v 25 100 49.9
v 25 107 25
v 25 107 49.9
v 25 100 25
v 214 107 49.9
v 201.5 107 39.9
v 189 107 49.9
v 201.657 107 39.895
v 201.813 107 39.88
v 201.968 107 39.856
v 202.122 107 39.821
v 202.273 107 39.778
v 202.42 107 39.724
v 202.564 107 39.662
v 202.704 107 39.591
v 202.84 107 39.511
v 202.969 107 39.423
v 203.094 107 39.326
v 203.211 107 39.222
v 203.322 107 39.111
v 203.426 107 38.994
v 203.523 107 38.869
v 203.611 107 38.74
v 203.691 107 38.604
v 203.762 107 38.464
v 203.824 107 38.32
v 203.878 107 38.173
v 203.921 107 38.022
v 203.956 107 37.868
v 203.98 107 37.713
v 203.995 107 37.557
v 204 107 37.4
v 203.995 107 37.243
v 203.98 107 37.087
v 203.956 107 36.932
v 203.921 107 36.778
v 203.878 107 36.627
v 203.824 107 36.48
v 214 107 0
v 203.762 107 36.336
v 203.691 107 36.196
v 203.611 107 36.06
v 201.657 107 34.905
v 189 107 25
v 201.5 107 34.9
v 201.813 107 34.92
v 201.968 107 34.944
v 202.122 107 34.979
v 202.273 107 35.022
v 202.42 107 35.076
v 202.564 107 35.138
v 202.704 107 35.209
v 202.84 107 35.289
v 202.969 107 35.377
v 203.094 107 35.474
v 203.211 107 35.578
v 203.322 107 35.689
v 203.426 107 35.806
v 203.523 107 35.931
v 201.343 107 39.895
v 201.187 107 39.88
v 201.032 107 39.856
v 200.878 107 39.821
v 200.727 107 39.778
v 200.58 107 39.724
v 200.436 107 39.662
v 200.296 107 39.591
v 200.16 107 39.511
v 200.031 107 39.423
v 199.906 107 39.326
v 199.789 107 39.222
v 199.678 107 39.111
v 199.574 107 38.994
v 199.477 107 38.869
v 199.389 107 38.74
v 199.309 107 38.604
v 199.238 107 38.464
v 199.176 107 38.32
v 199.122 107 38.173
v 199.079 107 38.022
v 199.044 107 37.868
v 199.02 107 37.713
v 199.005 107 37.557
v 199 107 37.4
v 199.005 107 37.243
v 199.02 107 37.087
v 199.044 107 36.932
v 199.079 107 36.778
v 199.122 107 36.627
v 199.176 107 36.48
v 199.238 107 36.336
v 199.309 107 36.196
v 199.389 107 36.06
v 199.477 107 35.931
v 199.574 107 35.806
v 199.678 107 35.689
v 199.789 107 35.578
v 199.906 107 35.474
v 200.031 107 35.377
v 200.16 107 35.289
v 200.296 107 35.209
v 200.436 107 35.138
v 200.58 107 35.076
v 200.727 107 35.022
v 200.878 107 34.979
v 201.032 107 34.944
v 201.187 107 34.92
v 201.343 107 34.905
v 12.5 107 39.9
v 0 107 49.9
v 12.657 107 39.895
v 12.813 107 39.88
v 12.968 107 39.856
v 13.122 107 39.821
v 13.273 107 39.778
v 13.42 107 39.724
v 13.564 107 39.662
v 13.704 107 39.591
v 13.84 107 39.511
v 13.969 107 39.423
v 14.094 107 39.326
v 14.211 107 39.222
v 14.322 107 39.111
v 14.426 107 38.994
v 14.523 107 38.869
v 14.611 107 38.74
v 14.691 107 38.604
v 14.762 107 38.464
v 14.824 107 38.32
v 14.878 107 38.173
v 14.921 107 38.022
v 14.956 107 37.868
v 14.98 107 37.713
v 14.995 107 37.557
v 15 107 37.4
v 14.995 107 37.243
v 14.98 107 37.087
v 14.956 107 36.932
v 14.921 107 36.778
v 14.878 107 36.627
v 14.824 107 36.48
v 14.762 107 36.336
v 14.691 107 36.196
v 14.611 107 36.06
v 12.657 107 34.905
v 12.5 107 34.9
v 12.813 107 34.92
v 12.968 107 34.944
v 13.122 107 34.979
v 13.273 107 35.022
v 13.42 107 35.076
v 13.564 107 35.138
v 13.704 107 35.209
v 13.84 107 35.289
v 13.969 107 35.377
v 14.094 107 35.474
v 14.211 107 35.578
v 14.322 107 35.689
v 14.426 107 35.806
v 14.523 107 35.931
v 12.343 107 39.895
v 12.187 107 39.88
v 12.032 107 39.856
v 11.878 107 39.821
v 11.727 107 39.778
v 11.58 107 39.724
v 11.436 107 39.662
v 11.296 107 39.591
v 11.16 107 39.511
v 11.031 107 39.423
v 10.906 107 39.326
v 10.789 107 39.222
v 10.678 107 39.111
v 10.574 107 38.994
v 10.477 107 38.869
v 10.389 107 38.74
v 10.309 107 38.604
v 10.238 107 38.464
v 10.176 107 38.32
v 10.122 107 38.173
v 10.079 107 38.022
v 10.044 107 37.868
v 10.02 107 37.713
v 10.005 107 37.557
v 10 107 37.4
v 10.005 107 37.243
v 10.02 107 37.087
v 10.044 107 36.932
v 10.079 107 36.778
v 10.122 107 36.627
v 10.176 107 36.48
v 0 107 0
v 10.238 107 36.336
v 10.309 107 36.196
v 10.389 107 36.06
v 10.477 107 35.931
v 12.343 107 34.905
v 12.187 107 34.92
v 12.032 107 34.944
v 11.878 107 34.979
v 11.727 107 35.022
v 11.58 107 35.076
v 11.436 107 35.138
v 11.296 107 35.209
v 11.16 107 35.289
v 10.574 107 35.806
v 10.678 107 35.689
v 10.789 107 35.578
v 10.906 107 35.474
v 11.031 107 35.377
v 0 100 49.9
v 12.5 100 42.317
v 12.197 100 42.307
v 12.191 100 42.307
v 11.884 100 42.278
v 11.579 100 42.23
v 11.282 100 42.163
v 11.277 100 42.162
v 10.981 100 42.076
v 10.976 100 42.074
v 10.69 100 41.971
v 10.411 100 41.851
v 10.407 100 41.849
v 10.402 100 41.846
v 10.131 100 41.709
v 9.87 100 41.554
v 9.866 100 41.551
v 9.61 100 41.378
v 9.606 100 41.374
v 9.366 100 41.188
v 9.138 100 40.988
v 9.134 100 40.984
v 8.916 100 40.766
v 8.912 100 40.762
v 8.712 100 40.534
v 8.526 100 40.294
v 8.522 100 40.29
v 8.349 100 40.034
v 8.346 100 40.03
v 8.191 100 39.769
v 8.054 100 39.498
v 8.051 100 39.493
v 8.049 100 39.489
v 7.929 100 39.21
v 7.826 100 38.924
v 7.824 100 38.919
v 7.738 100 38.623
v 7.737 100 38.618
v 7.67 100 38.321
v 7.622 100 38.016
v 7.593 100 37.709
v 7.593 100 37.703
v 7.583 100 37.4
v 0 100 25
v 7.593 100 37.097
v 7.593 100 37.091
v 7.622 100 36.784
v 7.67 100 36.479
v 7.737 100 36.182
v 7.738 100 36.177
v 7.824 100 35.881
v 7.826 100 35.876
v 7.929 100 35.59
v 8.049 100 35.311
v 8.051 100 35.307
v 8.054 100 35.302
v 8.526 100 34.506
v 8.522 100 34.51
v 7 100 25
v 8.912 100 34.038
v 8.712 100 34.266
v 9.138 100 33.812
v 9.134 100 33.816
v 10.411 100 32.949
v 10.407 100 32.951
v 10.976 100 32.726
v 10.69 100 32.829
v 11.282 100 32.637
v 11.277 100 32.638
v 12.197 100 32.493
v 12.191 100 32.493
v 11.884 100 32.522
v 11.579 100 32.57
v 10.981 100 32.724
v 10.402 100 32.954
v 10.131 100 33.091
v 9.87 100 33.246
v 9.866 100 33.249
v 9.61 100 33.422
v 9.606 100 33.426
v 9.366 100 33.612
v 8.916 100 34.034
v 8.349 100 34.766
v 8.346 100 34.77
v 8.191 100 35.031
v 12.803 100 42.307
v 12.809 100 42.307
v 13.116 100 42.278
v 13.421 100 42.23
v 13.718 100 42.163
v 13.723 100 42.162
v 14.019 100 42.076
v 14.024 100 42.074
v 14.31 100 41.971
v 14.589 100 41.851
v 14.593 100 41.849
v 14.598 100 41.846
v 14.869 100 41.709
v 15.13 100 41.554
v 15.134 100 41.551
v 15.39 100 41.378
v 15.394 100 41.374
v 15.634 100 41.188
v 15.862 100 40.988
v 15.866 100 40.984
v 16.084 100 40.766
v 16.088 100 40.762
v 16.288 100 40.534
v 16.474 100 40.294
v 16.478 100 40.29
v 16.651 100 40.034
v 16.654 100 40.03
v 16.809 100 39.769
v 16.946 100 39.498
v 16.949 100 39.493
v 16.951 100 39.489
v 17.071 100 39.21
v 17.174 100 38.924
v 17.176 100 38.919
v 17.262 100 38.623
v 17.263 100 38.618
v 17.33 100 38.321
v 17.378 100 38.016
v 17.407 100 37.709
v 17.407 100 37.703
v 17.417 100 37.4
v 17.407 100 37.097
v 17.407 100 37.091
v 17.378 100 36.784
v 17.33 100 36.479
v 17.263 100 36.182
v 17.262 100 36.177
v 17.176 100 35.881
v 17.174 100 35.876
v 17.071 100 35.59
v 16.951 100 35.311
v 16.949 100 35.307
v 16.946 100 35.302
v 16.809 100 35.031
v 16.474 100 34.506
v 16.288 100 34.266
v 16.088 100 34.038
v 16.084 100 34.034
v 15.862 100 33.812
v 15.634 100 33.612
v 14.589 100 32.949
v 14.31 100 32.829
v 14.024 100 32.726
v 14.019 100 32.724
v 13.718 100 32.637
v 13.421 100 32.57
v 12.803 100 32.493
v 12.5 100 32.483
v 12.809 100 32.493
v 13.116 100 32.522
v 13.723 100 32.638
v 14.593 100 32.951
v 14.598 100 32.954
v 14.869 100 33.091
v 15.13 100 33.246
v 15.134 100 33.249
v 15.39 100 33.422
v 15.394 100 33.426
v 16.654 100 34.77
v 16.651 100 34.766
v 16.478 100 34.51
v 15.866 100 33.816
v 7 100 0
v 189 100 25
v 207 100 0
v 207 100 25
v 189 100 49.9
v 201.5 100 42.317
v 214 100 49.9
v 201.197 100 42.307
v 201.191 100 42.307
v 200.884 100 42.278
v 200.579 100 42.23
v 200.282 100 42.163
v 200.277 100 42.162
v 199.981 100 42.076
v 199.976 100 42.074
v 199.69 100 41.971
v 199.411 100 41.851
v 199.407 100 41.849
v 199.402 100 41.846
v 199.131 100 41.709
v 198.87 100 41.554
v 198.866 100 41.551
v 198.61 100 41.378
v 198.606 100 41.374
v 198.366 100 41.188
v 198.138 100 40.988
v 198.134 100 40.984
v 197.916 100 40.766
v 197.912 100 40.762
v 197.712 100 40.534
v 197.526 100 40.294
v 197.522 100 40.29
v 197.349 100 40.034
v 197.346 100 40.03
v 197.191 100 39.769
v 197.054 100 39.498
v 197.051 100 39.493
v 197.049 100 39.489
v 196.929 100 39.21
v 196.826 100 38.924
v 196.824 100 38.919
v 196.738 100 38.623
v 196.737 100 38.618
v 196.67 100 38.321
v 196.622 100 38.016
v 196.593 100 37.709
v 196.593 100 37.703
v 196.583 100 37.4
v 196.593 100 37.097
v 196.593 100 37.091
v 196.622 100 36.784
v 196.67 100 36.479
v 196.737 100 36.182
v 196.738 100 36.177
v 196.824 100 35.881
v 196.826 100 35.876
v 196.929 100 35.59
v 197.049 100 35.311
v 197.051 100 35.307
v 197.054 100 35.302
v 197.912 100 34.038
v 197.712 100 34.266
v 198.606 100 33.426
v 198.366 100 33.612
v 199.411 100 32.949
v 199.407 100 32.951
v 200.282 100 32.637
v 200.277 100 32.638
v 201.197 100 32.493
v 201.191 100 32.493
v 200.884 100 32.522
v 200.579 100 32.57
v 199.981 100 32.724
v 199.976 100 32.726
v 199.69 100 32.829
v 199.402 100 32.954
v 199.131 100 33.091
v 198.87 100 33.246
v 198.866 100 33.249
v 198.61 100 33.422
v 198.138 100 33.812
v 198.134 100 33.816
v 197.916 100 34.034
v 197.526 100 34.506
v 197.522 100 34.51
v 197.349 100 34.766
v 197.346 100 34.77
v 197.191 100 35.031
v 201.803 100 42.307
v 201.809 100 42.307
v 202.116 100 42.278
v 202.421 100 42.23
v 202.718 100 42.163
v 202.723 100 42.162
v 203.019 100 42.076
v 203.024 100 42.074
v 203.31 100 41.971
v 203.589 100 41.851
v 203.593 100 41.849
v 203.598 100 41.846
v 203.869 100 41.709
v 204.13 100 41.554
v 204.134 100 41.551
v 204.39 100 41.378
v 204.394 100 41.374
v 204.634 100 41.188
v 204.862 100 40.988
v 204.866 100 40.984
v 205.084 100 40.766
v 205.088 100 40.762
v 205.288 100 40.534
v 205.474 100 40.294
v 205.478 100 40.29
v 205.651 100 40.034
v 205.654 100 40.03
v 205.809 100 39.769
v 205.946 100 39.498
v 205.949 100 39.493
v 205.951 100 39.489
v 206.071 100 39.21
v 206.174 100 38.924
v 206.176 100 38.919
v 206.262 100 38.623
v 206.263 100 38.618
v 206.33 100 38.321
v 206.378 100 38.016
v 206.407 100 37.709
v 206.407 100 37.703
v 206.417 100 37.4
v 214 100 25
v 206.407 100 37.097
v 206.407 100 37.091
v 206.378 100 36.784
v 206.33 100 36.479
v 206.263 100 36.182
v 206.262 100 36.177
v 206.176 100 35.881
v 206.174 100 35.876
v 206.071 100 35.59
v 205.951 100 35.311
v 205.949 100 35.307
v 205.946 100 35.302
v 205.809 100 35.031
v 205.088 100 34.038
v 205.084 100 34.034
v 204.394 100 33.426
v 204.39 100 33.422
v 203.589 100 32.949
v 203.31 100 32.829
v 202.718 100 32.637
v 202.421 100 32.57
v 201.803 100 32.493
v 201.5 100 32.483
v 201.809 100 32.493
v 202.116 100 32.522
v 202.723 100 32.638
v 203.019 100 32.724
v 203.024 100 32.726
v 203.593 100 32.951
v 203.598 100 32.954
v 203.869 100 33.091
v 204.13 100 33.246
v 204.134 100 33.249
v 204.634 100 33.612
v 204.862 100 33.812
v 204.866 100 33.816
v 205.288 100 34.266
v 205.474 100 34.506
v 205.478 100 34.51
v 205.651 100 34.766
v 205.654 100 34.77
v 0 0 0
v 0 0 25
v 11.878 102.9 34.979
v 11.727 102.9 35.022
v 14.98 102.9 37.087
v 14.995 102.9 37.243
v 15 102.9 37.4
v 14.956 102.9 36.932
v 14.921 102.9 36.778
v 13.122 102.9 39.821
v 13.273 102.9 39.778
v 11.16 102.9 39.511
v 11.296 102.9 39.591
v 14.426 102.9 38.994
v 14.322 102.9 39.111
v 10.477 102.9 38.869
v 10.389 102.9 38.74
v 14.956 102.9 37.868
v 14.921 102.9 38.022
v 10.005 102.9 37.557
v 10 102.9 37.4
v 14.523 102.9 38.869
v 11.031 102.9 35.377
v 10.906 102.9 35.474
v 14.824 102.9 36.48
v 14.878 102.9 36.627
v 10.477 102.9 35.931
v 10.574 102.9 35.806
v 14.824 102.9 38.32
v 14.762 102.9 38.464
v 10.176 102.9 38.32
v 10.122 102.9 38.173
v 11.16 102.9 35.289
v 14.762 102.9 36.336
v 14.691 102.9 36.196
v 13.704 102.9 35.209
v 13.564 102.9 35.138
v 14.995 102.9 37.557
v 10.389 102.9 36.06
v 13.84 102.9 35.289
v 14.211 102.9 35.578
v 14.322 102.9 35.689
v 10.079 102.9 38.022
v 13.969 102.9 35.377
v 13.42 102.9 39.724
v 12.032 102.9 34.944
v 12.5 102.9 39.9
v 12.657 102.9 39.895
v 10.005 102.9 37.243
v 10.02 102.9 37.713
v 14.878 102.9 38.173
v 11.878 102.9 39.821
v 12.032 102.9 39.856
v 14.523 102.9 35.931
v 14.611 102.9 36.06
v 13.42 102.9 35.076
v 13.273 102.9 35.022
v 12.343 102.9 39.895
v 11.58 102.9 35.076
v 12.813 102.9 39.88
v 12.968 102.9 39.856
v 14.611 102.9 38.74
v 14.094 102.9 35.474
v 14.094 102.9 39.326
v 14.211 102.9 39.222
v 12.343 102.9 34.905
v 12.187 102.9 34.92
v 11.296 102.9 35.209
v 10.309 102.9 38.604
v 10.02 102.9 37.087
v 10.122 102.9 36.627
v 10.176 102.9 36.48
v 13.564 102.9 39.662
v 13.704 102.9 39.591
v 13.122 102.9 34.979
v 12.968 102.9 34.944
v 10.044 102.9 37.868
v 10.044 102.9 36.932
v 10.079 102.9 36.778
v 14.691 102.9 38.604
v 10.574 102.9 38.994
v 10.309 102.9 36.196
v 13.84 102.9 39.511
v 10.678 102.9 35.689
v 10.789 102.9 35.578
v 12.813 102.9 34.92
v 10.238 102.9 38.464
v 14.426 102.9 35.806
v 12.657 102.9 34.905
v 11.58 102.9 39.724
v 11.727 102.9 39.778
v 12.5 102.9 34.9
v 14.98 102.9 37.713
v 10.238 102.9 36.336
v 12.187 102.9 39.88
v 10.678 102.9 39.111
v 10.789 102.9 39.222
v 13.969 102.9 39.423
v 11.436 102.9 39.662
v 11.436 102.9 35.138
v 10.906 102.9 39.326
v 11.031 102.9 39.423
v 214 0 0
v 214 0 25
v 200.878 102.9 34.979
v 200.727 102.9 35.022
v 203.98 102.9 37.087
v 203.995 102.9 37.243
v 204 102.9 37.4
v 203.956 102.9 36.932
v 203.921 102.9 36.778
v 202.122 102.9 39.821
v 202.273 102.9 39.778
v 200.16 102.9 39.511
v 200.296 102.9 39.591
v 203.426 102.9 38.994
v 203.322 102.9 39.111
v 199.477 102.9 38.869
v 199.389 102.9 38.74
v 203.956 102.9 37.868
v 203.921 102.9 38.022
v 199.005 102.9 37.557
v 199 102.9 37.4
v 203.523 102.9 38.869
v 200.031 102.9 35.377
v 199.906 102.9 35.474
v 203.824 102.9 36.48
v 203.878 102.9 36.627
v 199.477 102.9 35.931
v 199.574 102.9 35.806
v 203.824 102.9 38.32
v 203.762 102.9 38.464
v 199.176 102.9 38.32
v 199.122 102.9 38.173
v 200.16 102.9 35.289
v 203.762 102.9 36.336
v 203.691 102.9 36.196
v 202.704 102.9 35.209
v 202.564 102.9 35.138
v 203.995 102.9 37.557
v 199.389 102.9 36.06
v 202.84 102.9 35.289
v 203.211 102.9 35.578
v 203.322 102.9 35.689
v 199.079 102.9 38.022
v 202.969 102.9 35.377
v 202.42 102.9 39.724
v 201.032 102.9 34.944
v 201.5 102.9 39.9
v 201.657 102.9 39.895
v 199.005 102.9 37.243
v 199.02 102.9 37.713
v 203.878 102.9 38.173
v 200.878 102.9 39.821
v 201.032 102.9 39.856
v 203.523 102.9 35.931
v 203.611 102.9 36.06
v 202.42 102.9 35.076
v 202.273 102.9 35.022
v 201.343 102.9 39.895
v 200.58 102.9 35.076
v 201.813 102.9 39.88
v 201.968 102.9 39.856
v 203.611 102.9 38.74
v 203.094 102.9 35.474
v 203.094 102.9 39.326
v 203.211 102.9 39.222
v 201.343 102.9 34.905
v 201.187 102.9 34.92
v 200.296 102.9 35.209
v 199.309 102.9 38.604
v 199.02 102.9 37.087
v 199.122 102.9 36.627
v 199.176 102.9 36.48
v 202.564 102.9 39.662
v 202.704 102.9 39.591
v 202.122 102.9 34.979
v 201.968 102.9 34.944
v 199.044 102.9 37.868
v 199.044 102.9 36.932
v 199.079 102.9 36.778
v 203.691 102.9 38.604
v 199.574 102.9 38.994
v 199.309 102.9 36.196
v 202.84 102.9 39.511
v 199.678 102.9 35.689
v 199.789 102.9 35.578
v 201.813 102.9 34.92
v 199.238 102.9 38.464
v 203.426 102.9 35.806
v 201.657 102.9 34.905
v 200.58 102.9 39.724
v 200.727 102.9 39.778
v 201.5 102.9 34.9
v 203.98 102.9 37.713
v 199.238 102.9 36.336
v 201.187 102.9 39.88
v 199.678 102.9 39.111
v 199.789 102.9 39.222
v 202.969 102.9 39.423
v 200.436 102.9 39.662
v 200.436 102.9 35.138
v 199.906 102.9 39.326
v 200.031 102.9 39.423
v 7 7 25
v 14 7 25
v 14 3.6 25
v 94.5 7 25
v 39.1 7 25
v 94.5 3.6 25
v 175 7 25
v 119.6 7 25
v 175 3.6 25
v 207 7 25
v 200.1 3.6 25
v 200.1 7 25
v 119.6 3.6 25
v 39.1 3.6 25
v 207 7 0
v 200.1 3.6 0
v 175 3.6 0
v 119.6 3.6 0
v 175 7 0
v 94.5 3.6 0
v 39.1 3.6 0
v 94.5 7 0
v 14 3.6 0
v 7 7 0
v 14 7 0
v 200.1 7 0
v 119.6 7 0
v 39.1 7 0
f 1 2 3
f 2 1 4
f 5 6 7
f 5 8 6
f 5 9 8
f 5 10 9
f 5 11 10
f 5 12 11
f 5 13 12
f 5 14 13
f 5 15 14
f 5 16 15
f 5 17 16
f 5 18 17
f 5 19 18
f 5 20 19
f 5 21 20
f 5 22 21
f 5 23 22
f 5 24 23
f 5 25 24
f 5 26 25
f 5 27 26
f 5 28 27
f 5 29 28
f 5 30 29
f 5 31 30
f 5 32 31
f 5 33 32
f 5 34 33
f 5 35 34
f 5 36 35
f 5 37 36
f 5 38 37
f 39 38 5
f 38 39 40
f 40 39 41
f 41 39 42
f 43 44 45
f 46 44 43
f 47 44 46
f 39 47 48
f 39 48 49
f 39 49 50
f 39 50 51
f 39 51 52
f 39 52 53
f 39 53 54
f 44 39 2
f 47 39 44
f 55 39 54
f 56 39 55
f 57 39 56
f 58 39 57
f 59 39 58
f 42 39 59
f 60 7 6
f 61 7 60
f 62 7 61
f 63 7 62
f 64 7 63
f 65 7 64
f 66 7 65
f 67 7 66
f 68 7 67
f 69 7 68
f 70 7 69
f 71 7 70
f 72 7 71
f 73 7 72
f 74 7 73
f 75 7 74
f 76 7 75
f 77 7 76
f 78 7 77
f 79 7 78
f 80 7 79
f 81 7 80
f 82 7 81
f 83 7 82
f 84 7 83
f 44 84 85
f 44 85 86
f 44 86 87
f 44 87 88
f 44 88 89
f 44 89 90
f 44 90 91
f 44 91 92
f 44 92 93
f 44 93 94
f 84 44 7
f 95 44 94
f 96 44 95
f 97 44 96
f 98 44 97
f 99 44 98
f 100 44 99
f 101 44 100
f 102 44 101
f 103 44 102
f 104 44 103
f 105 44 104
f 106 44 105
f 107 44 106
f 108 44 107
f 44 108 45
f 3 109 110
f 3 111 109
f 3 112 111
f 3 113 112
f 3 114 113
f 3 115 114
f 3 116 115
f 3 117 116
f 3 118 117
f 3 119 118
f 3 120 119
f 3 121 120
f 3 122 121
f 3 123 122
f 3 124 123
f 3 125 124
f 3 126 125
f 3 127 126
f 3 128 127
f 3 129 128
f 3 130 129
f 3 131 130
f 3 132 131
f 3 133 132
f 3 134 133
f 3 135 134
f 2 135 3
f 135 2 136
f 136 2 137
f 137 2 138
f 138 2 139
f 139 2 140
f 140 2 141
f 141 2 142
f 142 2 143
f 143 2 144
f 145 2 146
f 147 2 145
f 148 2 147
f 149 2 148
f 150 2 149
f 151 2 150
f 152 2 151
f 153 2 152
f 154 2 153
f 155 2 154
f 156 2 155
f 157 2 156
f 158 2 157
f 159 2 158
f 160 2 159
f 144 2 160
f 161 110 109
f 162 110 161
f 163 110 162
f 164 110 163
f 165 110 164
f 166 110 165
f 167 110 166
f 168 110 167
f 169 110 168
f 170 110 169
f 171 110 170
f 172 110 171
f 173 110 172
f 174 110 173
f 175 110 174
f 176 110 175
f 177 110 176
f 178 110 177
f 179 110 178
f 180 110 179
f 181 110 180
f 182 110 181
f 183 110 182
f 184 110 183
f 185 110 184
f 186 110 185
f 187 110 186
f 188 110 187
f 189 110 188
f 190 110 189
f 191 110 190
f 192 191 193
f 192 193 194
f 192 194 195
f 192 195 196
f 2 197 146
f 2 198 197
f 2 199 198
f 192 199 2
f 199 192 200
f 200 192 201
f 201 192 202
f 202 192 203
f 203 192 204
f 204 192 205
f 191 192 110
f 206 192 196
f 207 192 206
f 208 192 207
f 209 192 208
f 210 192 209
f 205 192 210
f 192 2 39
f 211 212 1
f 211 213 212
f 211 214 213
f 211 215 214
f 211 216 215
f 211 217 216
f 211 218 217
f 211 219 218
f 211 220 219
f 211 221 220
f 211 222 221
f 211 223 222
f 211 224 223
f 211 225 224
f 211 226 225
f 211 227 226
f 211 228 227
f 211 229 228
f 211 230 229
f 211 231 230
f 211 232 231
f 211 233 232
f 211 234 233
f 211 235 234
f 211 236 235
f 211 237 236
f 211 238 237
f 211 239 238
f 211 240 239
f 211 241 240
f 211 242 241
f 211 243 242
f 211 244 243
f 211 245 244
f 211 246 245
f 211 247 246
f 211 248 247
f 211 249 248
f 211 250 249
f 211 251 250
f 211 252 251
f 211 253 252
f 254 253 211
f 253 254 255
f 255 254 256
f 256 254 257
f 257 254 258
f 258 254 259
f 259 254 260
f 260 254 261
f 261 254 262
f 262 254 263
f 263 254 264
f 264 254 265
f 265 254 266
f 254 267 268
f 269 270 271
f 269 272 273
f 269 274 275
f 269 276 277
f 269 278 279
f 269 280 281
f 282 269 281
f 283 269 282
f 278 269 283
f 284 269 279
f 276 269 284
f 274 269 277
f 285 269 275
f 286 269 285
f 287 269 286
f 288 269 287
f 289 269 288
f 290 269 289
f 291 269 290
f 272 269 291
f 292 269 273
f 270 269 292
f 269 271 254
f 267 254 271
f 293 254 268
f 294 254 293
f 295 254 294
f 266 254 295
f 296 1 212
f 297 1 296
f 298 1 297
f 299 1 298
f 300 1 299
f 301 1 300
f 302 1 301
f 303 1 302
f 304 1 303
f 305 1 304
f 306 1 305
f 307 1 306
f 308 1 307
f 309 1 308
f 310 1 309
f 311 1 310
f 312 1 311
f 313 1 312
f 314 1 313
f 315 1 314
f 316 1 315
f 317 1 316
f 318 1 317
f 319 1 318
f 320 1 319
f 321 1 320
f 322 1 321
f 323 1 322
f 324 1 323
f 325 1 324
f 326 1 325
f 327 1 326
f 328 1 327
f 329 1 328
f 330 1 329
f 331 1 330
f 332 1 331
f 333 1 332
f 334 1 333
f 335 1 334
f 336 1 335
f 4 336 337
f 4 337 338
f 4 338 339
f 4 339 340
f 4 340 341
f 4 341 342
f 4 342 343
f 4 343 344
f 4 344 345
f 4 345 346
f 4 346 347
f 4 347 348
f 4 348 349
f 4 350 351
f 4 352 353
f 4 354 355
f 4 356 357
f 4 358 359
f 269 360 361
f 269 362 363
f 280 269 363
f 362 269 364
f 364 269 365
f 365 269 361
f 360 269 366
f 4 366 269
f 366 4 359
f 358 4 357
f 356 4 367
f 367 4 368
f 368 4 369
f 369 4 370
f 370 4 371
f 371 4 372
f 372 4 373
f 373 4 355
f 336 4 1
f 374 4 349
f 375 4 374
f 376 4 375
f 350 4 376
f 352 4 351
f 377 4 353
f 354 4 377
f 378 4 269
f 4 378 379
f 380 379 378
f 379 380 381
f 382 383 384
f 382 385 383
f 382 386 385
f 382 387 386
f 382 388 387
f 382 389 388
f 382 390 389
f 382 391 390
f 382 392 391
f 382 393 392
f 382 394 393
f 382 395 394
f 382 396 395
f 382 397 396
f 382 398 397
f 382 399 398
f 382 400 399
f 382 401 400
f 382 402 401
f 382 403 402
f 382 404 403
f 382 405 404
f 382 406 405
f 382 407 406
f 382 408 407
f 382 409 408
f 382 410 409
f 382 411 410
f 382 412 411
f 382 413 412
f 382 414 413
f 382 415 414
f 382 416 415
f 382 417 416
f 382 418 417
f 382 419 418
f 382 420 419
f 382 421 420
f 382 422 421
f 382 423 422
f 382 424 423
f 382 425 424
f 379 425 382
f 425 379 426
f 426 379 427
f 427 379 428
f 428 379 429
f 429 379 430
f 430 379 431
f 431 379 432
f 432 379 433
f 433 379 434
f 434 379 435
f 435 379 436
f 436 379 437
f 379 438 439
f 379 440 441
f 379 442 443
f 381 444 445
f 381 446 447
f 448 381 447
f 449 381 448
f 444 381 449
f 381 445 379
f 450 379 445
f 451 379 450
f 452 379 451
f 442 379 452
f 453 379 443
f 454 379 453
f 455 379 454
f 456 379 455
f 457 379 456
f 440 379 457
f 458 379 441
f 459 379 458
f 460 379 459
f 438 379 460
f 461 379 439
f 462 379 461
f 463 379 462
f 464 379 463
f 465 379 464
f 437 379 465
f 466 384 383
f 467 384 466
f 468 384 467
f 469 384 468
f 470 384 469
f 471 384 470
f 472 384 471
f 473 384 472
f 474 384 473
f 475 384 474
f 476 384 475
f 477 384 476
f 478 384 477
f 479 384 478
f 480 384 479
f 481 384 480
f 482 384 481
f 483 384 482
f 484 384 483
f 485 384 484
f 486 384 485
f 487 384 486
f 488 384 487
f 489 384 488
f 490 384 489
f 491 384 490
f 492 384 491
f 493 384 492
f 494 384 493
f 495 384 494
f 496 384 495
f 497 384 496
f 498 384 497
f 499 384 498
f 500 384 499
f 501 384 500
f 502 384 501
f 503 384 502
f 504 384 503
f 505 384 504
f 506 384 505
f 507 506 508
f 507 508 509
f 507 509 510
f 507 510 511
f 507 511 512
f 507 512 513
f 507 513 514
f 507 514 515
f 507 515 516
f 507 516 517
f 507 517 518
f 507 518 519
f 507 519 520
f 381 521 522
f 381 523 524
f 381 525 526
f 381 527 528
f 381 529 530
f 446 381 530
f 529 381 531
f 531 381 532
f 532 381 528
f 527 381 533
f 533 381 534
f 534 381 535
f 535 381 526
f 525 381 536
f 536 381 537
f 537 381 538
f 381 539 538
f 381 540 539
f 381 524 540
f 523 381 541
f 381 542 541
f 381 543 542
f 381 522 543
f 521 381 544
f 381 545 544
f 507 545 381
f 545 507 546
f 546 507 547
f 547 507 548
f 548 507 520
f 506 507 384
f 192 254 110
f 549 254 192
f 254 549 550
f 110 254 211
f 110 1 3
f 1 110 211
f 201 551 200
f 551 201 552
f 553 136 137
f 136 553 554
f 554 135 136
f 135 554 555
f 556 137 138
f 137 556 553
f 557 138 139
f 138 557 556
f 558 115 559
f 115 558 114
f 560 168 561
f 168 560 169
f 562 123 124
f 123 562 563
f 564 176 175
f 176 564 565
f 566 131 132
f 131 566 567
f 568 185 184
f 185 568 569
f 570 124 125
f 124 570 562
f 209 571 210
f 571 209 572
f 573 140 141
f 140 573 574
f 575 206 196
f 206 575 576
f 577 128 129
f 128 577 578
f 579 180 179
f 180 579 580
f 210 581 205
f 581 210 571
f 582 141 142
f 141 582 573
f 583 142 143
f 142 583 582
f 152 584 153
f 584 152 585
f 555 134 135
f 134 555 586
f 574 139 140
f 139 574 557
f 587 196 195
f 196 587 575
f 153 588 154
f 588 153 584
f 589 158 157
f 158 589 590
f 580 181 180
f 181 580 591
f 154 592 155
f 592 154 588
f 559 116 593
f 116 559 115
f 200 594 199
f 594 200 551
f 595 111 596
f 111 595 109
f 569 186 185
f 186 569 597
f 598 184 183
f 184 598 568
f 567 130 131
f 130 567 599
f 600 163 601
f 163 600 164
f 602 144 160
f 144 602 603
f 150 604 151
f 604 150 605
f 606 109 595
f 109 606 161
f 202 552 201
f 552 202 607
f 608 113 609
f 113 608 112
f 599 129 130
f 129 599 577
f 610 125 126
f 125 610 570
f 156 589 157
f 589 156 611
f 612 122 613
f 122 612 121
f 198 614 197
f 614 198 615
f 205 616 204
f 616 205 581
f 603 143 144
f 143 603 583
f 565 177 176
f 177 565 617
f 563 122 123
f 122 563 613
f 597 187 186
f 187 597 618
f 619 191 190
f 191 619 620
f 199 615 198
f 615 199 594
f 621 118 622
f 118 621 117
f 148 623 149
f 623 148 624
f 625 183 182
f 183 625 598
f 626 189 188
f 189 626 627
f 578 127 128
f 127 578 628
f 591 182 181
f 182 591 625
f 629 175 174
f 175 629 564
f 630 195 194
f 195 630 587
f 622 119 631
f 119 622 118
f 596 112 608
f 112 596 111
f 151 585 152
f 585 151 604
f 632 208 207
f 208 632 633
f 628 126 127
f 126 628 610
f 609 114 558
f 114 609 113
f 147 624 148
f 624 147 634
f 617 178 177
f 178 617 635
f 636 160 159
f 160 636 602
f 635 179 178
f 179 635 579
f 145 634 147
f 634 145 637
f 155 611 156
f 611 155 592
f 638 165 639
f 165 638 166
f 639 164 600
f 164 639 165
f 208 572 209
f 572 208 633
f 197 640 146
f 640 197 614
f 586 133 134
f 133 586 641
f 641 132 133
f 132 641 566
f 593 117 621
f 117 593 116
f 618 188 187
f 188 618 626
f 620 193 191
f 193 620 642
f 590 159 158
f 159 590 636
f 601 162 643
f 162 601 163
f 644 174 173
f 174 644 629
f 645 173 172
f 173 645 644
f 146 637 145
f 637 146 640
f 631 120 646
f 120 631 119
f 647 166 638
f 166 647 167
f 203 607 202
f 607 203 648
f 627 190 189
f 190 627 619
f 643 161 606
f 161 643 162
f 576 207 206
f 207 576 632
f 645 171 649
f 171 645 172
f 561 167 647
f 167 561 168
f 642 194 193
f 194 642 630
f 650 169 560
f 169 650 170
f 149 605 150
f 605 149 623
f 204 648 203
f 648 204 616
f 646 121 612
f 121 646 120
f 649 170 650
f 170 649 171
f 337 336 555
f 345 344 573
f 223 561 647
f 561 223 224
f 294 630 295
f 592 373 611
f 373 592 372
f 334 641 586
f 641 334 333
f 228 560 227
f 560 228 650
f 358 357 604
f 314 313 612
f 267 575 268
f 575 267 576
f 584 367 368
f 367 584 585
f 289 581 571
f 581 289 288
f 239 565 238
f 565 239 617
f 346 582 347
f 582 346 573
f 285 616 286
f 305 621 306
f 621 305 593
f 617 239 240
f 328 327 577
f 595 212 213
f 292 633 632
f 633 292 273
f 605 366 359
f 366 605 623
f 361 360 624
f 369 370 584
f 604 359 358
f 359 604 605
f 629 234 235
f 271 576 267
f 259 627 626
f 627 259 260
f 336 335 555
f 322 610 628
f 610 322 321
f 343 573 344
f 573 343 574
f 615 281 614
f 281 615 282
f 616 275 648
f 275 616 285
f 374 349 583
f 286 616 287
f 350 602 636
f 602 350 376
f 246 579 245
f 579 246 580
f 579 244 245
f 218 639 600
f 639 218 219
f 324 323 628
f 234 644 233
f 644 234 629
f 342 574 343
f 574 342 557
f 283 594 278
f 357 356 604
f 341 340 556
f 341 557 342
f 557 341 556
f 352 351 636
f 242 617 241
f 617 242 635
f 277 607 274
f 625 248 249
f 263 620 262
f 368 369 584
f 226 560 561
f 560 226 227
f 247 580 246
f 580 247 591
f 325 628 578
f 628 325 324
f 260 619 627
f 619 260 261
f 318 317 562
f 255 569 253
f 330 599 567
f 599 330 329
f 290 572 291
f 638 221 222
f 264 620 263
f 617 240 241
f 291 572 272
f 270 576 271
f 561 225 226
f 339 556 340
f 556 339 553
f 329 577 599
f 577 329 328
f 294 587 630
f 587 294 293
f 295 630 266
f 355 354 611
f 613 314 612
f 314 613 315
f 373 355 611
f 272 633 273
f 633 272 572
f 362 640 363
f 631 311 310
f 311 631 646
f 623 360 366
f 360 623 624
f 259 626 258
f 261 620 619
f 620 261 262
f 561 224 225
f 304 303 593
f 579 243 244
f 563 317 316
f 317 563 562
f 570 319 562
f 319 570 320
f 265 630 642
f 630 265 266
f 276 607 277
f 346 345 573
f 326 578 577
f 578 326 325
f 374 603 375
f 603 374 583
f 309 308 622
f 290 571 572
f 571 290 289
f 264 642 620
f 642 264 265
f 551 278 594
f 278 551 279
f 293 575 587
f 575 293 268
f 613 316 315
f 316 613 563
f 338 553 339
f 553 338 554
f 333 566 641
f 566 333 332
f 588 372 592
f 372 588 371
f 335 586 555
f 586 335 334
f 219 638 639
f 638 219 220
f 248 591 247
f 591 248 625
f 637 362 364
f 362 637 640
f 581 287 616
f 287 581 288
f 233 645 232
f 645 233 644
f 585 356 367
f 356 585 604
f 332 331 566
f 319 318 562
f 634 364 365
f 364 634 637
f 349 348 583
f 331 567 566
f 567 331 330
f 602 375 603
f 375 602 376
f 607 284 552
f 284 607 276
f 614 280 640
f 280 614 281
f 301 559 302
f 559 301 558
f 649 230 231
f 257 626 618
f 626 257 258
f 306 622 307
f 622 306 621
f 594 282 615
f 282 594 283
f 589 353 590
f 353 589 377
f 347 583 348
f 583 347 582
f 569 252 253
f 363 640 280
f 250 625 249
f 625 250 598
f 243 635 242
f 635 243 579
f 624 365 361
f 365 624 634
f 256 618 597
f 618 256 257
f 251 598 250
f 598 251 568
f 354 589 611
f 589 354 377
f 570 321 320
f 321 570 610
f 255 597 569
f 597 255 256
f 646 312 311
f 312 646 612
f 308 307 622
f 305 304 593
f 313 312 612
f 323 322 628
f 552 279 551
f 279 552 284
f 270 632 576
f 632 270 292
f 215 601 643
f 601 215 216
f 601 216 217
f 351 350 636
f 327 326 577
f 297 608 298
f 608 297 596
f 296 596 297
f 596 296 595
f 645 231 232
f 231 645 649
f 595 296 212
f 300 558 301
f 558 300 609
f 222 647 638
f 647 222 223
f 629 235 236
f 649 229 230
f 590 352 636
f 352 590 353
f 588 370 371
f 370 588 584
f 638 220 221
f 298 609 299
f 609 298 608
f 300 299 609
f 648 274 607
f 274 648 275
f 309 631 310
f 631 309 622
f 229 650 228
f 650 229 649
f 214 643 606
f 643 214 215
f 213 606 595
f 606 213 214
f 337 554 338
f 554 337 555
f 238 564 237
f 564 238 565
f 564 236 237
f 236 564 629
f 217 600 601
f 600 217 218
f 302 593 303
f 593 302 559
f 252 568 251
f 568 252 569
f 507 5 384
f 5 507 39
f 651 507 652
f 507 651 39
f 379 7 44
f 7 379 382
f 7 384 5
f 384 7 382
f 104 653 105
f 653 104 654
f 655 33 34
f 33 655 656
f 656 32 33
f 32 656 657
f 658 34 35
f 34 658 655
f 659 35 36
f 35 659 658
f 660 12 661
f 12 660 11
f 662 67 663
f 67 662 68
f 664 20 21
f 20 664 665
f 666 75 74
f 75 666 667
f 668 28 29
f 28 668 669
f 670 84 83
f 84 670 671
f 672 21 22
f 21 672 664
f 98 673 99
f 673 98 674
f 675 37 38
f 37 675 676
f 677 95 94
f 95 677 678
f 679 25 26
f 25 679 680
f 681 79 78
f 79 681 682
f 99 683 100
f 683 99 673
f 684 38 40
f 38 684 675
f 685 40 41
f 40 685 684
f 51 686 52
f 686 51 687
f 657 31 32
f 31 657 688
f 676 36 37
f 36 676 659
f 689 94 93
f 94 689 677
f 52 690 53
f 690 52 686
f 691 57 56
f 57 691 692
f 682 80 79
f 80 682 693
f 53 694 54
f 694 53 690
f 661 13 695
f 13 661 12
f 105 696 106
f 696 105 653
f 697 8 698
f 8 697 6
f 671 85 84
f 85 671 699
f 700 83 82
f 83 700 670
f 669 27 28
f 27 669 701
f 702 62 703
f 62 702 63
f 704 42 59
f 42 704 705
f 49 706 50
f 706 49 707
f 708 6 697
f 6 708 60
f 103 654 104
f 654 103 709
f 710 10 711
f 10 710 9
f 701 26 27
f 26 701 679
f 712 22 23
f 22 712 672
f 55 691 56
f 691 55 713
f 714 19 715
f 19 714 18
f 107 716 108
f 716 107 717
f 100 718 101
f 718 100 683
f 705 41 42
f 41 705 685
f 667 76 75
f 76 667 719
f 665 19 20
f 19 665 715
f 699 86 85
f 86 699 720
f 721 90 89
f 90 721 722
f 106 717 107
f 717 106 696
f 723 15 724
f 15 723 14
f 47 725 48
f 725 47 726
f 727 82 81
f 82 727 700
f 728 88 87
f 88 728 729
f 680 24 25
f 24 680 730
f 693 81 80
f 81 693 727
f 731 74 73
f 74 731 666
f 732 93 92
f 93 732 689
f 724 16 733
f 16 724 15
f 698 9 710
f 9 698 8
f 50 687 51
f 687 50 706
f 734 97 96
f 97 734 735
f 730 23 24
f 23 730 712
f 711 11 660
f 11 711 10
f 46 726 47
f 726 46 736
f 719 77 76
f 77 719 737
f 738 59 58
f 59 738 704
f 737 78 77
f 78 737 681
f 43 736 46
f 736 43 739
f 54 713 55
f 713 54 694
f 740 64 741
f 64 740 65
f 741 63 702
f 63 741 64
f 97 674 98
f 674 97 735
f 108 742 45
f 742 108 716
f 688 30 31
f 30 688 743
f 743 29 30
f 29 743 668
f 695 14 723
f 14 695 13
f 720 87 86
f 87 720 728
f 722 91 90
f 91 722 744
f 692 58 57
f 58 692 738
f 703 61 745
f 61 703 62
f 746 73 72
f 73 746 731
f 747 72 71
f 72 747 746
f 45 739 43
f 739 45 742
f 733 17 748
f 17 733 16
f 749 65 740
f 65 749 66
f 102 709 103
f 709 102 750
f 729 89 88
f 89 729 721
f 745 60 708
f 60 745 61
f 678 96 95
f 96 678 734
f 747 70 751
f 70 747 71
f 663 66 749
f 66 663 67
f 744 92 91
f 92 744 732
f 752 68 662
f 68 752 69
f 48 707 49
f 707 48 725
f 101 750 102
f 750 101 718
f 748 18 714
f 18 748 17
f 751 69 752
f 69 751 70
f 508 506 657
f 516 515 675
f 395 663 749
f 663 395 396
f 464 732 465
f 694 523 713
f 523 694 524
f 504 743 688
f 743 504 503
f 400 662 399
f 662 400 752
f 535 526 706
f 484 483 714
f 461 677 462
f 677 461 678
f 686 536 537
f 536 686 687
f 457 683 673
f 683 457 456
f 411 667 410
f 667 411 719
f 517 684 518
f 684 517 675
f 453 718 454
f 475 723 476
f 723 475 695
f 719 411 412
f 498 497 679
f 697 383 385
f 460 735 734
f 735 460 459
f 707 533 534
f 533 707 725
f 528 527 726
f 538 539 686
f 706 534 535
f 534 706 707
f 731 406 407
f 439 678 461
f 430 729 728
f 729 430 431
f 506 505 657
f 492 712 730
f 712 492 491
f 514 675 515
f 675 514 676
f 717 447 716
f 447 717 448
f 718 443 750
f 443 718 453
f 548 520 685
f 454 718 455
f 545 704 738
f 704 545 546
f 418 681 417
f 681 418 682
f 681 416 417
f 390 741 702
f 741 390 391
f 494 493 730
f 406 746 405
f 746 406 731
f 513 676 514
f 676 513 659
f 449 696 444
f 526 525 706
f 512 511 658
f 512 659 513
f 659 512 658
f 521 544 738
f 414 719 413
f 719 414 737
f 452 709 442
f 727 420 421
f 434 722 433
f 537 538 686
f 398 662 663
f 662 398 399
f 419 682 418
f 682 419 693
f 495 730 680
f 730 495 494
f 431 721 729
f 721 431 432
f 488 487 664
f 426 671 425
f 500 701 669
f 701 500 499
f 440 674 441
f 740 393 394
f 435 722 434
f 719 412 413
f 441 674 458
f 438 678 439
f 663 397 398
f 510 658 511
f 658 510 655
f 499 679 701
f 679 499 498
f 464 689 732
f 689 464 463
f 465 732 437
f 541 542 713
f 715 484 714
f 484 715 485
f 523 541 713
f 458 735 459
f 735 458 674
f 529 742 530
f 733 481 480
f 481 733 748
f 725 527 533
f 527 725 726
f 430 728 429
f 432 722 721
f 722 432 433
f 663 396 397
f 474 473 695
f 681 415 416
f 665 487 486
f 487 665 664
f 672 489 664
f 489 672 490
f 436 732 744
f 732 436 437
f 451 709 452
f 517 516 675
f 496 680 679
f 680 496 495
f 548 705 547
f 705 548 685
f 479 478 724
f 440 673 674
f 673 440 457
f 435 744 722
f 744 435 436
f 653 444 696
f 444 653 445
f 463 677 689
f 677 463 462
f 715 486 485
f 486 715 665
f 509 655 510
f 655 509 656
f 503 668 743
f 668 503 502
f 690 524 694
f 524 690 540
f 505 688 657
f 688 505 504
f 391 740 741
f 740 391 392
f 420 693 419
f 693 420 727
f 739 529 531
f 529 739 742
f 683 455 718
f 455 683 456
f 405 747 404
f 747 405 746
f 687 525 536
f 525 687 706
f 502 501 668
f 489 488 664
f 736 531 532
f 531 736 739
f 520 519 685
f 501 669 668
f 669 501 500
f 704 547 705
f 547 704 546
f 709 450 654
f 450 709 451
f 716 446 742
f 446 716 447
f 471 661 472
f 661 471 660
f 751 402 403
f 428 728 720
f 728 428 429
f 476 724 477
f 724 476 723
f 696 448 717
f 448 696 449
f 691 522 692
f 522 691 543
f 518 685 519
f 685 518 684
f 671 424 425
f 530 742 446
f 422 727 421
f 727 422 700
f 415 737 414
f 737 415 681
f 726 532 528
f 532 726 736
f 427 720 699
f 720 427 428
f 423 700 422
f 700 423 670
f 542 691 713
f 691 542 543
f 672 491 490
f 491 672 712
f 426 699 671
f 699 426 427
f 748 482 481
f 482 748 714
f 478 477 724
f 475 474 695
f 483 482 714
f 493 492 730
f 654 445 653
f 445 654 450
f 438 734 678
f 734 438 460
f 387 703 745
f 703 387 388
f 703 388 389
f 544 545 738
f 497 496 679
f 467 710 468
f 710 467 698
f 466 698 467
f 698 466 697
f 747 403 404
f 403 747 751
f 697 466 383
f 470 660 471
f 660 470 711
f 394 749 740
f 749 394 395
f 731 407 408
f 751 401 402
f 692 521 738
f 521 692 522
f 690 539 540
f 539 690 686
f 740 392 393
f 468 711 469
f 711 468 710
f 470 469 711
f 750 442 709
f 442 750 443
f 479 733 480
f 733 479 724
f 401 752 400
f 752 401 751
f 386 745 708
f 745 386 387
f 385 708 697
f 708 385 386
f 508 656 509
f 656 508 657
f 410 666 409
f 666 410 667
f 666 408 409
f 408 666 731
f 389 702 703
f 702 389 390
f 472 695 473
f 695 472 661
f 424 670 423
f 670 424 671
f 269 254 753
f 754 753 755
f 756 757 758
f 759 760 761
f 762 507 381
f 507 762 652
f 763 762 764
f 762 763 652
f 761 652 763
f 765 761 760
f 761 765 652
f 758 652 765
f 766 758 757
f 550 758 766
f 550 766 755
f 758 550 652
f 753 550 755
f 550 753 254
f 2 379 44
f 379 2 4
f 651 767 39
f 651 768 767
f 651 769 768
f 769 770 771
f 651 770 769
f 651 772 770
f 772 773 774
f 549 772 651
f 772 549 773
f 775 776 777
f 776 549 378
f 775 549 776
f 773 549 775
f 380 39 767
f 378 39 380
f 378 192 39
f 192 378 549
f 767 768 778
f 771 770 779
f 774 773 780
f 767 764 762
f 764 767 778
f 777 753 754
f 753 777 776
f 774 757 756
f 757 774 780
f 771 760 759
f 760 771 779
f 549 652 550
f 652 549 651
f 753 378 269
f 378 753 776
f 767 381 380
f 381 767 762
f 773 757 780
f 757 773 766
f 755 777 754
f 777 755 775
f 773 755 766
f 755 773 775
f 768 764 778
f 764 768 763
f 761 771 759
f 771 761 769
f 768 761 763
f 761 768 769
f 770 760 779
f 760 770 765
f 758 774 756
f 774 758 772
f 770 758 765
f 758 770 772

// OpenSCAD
// file: bitholder_lib.scad
// simple shelf to hold the bit screwdrivers
// the selves will be attached to a larger IKEA shelf systemwith screws from below
// the surroundig boxes for the two sets are:
// (depth, depth stop, height, width)
// 220, 190, 100, 200 (mm)
// 220, 170, 70, 140 (mm)

material_width = 7; // mm
shelf_depth = 220;
shelf1_depth_stop = 190;


shelf2_depth_stop = 170;


rail_depth = 25;
ear_length = 25;

epsilon = 0.1;

module ear() {
    difference() {
        translate([0, 0, material_width / 2])
            cube([ear_length, ear_length, material_width], center = true);
        translate([0, 0, - epsilon])
            cylinder(d = 5, h = material_width + 2 * epsilon, $fn = 100);
        translate([0, 0, - epsilon])
            cylinder(d1 = 10, d2 = 5, h = 3, $fn = 100);
    }
}
rail(100, 140);
module rail(width, height) {
    difference() {
        union() {
            // the bottom rail
            cube([width + 2 * material_width, material_width, rail_depth]);

            // the sides of the rail
            cube([material_width, height + material_width, rail_depth]);
            translate([width + material_width, 0, 0])
                cube([material_width, height + material_width, rail_depth]);

            // the top rail
            translate([0, height, 0])
                cube([width + 2 * material_width, material_width, rail_depth]);

            // the ears to hold the rail in place with screws
            translate([ear_length / 2, height, ear_length / 2 + rail_depth - epsilon])
                rotate([- 90, 0, 0])
                    ear();
            translate([width + 2* material_width - ear_length / 2, height, ear_length / 2 + rail_depth - epsilon])
                rotate([- 90, 0,])
                    ear();
        }
        translate([material_width * 2, material_width / 2 + epsilon, - epsilon])
            cube([rail_depth + epsilon, material_width / 2 + epsilon, rail_depth + 2 * epsilon]);
        translate([width - rail_depth, material_width / 2 + epsilon, - epsilon])
            cube([rail_depth + epsilon, material_width / 2 + epsilon, rail_depth + 2 * epsilon]);
        translate([width / 2 - rail_depth / 2 + material_width, material_width / 2 + epsilon, - epsilon])
            cube([rail_depth + epsilon, material_width / 2 + epsilon, rail_depth + 2 * epsilon]);
    }
}

module bottom() {
    difference() {
        cube([shelf_depth, rail_depth, material_width]);
        translate([- epsilon, - epsilon, - epsilon])
            cube([rail_depth + epsilon, rail_depth + 2 * epsilon, material_width / 2 + epsilon]);
        translate([shelf_depth - rail_depth + epsilon, - epsilon, - epsilon])
            cube([rail_depth + epsilon, rail_depth + 2 * epsilon, material_width / 2 + epsilon]);
    }
}
// main file
use <bitholder_lib.scad>;


shelf_height = 100;
shelf_width = 200;

rail(shelf_width, shelf_height);
